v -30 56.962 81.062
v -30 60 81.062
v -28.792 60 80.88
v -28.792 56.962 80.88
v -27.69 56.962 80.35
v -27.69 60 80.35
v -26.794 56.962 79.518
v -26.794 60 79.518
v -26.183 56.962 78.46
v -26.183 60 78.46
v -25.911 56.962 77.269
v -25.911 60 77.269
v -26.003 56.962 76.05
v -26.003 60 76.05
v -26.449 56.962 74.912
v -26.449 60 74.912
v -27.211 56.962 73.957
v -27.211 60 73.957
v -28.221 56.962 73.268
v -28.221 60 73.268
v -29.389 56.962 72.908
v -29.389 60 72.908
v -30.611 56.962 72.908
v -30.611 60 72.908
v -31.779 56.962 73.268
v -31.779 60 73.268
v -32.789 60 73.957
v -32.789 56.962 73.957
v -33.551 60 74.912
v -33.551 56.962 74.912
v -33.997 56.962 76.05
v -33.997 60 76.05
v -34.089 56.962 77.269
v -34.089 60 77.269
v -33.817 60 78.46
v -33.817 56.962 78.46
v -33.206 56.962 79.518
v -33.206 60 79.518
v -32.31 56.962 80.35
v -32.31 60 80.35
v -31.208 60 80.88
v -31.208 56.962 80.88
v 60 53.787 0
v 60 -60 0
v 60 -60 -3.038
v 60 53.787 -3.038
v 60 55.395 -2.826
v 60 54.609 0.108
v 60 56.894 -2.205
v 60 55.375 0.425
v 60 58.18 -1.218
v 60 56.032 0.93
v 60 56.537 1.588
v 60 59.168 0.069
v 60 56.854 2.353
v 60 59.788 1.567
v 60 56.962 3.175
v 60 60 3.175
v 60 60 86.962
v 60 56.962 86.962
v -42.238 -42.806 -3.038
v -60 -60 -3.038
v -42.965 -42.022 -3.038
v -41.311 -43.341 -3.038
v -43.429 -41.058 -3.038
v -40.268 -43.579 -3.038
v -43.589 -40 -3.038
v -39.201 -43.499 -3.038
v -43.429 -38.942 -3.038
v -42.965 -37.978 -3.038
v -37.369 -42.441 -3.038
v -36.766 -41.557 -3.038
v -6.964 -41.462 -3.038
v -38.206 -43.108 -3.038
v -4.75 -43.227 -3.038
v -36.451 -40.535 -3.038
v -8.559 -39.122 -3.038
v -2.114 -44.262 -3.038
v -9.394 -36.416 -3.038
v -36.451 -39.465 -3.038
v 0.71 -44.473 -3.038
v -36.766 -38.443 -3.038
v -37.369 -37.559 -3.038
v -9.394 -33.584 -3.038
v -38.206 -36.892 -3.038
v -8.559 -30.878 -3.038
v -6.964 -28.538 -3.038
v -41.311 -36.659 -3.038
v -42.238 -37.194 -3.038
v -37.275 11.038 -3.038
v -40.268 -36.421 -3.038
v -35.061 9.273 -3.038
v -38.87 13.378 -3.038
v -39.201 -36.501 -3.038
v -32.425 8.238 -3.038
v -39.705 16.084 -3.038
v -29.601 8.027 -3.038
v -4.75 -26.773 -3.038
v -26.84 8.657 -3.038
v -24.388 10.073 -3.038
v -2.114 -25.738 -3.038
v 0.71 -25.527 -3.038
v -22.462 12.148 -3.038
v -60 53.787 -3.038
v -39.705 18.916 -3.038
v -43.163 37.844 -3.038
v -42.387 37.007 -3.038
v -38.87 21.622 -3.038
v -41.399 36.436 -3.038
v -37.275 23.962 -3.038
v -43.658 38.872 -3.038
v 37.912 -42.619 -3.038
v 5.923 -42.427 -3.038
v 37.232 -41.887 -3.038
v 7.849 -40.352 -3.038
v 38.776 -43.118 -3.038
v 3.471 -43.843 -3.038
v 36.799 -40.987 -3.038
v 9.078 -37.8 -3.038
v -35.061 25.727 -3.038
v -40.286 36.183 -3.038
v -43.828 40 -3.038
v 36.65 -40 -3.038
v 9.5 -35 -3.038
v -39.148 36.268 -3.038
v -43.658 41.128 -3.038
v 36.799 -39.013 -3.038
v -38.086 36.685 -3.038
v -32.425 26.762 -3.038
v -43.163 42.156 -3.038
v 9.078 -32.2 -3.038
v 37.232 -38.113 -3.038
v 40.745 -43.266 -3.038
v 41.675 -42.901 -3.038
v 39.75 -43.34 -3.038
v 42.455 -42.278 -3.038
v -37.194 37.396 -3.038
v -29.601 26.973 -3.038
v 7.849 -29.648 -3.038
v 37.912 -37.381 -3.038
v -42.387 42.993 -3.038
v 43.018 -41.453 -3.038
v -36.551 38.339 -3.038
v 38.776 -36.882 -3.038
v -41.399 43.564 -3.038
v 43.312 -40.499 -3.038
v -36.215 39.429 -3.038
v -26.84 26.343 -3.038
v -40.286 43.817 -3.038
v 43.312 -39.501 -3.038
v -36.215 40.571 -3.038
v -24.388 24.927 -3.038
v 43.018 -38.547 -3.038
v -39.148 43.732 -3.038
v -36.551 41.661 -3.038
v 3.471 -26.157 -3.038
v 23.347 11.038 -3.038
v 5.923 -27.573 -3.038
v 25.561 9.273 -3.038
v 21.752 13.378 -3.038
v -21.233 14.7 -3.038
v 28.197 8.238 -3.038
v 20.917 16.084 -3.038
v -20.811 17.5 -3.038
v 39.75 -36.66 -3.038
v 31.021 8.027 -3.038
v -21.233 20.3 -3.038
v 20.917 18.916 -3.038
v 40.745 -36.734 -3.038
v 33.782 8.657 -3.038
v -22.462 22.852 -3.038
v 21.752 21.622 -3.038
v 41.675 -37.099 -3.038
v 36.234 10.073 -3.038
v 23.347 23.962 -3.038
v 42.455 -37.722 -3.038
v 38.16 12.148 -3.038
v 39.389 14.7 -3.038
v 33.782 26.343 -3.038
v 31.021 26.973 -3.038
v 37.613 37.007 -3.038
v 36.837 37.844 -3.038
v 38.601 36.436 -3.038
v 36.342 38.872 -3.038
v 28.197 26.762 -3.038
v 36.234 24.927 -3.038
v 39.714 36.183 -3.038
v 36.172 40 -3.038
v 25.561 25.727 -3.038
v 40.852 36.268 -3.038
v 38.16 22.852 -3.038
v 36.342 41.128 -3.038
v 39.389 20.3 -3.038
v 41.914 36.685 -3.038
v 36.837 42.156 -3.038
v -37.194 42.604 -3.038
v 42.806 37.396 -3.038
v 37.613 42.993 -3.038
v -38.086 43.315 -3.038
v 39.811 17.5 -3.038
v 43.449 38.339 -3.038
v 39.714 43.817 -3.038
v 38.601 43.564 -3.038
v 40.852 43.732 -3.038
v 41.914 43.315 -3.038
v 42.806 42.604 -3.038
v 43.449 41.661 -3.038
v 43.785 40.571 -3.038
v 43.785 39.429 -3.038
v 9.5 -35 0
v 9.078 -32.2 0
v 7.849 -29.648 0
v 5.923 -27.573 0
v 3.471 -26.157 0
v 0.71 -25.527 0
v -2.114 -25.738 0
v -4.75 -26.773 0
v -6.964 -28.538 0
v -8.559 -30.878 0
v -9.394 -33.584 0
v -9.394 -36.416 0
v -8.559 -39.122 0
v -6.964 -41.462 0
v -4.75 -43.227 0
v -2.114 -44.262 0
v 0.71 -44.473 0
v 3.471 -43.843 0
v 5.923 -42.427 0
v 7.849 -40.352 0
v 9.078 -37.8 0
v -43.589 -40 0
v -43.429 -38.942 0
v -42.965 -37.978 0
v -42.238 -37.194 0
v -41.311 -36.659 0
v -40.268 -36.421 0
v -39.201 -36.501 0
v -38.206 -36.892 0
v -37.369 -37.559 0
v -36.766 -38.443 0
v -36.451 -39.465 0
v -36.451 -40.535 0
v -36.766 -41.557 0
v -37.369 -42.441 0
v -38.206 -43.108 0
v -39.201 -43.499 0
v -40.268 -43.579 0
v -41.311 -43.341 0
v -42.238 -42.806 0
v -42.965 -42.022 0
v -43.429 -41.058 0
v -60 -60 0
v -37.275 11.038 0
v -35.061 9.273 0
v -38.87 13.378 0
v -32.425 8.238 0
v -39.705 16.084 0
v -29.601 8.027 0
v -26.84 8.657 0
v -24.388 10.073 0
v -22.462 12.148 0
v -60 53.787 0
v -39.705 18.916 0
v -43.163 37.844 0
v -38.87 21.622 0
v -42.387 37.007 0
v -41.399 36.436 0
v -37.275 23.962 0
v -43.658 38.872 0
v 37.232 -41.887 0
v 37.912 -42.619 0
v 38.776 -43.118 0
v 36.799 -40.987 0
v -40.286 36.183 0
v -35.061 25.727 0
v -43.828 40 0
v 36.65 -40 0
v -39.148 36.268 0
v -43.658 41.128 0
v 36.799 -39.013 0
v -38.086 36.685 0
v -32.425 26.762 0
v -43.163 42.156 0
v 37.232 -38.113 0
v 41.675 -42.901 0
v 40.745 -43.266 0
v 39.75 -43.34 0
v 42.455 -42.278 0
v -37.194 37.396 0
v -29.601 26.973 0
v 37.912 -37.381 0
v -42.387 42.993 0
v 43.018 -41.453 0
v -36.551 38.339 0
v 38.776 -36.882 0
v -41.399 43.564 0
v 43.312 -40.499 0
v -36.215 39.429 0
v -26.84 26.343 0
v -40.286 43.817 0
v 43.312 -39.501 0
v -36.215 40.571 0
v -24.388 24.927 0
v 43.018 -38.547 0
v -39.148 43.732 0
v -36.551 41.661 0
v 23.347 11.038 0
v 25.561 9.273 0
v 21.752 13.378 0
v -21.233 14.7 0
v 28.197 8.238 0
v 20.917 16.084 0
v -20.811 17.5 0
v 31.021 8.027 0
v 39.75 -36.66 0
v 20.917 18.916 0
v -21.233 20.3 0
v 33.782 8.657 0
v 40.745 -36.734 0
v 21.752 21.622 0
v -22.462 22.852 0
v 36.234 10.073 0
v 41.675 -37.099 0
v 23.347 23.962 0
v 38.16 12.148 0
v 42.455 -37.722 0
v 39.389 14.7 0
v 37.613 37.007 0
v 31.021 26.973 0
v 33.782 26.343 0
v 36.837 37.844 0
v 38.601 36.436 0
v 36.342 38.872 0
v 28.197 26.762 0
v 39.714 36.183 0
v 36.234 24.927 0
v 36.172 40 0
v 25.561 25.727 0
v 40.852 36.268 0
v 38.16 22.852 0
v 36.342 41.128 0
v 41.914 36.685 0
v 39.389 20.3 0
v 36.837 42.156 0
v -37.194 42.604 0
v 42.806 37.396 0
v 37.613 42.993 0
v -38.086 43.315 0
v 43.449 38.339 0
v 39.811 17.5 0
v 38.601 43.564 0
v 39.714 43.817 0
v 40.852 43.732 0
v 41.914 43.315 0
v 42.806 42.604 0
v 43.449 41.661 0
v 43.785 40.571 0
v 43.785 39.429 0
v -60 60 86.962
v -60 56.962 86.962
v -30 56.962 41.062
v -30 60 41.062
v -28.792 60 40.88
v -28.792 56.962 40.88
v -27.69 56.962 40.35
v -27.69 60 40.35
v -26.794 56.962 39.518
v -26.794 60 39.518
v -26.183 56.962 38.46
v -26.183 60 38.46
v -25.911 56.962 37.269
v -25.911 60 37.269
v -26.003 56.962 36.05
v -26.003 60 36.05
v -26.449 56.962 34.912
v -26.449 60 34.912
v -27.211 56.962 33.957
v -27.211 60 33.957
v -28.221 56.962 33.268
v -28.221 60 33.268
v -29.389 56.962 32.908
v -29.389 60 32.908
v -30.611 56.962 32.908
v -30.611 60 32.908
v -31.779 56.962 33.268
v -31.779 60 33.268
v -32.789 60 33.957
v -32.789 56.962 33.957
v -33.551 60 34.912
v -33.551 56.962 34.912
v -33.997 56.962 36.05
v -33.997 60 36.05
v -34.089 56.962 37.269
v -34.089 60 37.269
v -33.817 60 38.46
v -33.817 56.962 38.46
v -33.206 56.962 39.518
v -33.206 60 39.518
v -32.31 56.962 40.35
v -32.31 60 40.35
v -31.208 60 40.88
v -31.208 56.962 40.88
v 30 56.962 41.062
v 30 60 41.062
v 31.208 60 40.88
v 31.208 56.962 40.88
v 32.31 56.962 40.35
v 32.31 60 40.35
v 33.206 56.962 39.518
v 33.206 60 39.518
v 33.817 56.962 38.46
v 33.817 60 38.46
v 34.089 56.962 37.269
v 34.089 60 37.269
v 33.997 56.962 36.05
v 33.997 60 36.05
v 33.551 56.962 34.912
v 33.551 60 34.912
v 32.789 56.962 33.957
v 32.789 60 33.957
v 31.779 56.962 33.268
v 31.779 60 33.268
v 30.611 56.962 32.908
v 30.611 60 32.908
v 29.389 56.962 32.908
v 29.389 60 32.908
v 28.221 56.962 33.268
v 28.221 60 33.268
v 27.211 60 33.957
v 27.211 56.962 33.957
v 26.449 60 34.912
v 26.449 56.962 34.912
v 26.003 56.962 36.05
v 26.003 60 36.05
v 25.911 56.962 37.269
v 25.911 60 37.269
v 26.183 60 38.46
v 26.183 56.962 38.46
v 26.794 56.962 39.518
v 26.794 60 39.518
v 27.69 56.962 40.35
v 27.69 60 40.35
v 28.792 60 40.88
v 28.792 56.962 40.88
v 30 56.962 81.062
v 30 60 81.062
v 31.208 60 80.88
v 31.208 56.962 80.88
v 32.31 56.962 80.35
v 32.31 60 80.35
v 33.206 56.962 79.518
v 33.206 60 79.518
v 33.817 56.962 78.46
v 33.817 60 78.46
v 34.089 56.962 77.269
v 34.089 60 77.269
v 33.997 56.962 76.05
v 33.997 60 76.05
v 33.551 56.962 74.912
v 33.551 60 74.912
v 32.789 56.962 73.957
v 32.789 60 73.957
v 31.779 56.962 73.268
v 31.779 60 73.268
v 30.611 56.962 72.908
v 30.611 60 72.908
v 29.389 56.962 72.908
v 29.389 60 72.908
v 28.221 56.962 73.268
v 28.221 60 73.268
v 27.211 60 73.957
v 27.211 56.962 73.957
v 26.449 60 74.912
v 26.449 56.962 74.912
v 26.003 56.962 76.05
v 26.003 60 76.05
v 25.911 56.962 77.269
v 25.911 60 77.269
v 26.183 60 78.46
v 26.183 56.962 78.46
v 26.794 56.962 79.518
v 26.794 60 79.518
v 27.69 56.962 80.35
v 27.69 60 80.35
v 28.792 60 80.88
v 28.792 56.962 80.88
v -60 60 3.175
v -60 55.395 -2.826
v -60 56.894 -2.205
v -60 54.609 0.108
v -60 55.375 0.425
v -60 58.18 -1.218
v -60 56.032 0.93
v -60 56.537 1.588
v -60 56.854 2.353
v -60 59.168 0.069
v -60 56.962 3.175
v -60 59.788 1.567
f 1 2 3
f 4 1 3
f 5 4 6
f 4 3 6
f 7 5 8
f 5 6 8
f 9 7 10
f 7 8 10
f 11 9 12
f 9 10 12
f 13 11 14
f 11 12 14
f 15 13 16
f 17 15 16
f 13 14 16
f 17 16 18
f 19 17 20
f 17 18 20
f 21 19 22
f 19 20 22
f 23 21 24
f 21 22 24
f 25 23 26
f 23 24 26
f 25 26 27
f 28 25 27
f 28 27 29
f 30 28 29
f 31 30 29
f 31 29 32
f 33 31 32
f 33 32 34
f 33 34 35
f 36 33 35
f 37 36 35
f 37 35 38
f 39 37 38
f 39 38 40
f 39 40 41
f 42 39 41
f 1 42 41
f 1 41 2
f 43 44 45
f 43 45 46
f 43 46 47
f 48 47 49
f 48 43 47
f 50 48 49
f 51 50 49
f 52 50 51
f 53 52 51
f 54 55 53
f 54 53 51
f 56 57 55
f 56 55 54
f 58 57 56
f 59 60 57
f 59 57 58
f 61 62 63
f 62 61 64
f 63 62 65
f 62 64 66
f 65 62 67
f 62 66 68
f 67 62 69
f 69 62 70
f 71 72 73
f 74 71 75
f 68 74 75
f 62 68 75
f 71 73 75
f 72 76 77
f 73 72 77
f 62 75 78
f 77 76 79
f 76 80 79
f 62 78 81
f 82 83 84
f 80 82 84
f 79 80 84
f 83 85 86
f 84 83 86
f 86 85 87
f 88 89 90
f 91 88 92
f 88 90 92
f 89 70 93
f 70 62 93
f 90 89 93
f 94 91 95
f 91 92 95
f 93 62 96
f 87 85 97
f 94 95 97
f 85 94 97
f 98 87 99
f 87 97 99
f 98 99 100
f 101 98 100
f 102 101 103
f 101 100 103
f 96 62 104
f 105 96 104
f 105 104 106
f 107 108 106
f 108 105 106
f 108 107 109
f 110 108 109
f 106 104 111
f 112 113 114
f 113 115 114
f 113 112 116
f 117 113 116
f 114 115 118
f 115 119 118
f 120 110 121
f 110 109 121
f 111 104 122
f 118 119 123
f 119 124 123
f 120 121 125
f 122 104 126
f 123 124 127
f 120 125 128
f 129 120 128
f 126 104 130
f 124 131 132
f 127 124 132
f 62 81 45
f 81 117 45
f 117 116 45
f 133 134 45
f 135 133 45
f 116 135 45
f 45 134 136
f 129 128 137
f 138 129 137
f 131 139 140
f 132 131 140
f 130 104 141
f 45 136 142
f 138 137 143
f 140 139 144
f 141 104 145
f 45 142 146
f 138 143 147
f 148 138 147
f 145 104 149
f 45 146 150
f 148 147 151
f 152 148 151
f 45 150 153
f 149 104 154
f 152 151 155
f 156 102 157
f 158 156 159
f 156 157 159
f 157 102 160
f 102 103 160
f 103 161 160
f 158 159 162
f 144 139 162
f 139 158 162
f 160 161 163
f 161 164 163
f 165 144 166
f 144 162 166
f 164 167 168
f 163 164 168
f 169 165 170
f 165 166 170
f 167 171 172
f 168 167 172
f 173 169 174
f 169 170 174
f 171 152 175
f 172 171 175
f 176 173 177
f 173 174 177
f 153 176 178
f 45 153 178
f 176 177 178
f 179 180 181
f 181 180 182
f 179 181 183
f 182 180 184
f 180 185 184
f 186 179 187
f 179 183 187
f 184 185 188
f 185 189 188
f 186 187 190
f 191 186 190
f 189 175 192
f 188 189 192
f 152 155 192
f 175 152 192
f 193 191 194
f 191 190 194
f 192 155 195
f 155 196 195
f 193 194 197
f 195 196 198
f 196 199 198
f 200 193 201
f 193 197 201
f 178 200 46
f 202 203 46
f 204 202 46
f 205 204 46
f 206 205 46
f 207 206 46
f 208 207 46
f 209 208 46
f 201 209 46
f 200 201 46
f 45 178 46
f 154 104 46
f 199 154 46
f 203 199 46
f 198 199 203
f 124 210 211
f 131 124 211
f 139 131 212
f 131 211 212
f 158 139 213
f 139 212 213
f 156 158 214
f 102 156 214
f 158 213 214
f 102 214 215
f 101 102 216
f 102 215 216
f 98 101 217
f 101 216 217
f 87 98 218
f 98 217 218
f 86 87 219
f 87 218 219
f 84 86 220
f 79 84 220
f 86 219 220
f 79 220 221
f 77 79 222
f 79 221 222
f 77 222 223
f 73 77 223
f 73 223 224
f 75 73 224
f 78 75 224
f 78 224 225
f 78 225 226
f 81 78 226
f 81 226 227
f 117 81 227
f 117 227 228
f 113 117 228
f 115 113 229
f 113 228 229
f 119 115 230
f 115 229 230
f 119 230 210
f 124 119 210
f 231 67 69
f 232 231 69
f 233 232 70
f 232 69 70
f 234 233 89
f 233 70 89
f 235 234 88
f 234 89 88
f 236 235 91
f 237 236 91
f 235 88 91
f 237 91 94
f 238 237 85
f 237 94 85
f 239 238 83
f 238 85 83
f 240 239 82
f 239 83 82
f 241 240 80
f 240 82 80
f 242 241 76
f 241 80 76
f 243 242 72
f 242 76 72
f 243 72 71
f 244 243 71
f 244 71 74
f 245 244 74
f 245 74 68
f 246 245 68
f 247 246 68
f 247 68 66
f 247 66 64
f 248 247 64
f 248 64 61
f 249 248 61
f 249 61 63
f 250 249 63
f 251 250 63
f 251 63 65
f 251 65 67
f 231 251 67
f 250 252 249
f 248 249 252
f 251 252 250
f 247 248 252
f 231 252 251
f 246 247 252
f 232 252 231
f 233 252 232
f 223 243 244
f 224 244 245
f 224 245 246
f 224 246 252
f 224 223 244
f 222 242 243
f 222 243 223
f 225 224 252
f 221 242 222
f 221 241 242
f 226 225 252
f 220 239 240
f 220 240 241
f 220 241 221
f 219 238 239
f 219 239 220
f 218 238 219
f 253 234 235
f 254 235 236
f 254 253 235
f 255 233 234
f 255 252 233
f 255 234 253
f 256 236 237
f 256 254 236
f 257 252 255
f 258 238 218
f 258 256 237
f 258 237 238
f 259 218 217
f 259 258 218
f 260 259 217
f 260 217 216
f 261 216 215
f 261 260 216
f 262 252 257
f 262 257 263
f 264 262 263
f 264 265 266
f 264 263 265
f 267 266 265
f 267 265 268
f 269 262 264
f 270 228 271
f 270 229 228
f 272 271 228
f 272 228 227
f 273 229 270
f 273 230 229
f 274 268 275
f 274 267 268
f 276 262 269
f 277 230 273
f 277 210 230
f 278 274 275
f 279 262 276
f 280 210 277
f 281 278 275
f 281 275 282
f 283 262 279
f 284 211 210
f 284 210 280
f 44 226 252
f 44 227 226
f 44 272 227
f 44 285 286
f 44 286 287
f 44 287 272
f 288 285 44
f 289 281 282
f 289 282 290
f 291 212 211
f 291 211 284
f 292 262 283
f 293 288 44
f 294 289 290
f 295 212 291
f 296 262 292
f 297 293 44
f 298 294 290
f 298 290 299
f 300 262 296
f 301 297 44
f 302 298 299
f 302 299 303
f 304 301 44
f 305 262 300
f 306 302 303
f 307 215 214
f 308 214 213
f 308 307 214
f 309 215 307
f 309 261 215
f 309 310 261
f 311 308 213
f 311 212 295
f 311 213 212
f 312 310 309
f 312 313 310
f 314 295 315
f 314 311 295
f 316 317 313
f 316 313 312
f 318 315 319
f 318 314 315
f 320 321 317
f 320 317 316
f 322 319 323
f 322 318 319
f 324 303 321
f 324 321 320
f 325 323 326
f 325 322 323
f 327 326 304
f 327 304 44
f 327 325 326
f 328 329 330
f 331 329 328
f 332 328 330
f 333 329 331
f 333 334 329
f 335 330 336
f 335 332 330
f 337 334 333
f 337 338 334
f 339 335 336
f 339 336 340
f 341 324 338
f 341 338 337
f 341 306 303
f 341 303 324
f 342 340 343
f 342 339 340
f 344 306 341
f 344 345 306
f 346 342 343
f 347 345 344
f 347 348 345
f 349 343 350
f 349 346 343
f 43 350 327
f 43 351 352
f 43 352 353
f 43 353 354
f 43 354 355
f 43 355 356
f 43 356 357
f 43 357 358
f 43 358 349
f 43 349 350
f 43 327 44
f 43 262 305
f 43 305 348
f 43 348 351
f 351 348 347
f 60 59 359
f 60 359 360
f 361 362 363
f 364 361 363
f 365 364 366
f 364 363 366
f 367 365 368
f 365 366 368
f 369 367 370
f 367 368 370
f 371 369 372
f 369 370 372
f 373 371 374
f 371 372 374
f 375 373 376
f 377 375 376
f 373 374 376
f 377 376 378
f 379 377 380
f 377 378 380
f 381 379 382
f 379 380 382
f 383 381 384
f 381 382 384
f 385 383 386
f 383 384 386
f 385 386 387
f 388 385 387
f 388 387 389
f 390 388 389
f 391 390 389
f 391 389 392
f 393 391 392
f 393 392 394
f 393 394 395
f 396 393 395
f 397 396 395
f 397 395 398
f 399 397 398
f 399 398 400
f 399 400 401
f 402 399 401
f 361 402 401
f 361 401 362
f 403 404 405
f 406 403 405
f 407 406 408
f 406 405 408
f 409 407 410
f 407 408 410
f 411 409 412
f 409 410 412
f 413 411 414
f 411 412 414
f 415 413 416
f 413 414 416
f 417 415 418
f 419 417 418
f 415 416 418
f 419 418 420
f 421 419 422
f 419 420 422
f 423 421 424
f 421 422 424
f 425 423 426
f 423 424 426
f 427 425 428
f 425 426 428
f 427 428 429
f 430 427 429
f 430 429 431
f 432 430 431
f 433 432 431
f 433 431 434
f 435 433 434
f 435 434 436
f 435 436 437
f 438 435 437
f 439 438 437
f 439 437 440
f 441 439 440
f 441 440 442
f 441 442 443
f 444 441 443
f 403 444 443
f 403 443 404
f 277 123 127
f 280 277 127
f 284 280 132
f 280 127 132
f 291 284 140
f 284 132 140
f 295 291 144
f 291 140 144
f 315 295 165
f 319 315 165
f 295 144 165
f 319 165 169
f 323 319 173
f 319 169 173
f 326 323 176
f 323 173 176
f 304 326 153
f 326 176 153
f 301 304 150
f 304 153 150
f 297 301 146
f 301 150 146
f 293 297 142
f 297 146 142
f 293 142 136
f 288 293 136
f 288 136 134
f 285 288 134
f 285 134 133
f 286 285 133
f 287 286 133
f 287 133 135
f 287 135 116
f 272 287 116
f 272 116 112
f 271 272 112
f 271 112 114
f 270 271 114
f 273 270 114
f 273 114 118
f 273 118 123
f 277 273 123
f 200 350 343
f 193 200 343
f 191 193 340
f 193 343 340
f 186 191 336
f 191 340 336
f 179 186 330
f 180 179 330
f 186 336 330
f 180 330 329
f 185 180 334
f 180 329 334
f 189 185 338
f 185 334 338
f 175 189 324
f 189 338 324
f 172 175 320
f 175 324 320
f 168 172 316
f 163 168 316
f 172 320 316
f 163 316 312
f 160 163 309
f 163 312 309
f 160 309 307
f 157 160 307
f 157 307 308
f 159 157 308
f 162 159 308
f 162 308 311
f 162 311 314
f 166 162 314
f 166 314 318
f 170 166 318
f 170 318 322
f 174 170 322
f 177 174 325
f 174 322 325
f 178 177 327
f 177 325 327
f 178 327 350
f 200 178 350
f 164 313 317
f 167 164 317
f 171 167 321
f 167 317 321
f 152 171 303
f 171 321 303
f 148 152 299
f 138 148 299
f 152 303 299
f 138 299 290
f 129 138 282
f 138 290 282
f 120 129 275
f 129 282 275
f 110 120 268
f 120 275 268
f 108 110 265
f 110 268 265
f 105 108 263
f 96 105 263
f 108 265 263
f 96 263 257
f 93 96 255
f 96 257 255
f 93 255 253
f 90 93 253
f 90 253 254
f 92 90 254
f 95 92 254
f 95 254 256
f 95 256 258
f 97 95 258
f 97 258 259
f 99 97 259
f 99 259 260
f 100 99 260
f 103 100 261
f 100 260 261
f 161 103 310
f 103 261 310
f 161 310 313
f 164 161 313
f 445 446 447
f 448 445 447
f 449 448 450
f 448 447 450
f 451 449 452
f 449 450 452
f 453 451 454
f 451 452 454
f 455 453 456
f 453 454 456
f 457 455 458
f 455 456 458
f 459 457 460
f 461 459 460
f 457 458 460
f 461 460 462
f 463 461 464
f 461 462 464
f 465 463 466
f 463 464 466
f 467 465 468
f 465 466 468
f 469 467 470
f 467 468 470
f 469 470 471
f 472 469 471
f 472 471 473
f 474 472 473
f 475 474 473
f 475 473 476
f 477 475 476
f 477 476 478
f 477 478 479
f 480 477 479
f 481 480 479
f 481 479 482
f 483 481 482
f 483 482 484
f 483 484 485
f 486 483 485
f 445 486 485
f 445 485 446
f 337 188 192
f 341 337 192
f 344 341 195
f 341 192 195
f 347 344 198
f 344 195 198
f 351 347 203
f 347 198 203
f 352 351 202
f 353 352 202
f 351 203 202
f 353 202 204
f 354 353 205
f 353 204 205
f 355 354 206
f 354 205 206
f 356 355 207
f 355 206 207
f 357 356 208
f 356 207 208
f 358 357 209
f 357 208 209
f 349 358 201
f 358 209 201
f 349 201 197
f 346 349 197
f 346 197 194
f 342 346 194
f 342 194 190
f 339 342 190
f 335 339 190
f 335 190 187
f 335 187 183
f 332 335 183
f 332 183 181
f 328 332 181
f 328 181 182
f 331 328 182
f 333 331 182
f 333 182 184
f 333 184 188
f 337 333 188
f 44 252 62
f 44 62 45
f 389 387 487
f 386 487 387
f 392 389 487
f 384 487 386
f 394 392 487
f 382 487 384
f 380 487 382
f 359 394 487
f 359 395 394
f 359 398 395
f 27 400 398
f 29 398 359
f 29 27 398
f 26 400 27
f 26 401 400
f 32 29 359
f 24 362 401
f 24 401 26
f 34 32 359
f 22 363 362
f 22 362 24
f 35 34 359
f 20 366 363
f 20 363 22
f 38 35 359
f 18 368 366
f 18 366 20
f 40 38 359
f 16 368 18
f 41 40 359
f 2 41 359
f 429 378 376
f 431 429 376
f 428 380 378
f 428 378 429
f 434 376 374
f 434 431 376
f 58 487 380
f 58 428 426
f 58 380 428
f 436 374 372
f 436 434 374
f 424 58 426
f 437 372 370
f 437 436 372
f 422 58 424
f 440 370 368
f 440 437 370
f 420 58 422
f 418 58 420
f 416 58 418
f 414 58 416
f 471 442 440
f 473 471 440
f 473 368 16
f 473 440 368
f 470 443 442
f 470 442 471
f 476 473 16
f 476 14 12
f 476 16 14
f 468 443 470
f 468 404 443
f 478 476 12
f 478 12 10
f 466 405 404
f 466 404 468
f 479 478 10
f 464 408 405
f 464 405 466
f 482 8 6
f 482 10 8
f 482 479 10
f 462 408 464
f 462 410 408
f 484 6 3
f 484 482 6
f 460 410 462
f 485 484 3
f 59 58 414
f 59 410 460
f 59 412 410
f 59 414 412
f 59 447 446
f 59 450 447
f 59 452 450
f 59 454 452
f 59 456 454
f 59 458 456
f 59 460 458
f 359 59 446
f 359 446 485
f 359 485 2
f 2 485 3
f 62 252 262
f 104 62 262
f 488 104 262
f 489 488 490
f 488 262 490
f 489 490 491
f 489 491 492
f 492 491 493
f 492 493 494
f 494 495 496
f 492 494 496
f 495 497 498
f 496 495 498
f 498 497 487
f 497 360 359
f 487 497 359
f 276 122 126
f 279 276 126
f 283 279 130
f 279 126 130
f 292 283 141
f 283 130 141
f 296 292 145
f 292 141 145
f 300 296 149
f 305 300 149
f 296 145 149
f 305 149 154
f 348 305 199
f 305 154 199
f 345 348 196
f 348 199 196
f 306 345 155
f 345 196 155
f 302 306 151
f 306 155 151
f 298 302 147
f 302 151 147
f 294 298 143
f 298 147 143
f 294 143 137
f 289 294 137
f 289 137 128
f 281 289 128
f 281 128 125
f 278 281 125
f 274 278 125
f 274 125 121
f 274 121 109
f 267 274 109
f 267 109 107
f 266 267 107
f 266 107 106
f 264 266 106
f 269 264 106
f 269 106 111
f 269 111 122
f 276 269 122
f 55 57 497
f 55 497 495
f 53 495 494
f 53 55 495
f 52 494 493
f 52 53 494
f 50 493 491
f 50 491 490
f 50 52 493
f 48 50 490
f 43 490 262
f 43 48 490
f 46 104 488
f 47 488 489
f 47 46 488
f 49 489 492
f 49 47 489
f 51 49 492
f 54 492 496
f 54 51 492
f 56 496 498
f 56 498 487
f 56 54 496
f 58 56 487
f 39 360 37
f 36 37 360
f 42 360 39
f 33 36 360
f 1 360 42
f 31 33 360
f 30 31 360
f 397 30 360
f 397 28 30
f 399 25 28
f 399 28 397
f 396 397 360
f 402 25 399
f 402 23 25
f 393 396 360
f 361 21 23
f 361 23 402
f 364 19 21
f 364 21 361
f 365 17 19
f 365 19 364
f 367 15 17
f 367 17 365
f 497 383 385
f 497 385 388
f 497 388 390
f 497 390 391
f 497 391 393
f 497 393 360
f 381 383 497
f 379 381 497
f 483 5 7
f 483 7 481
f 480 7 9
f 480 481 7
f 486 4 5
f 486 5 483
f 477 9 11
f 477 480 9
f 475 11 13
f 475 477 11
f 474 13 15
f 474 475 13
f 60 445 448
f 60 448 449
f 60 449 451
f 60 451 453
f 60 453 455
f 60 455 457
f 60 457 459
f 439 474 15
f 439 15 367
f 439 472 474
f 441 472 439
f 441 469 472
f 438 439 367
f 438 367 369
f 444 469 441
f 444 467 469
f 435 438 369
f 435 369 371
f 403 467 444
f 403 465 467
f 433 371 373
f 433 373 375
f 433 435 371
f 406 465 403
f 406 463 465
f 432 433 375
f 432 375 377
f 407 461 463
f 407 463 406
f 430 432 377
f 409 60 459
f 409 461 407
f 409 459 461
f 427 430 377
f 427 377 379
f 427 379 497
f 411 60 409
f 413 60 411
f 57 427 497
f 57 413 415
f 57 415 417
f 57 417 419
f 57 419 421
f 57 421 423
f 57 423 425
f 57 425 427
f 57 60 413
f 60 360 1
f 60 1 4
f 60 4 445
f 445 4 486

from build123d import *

# Parameters (mm, degrees)
CROQUIS1_W                       = 120
CROQUIS1_H                       = 120
CROQUIS1_R                       = 9.5
BRIDA_BASE1_DEPTH                = 3.03784
BRIDA_DE_ARISTA1_STRIP_W         = 18.50136
BRIDA_DE_ARISTA1_STRIP_H         = 3.03784
BRIDA_DE_ARISTA1_STRIP_CUT_DEPTH = 120
BRIDA_DE_ARISTA1_DEPTH           = 120
CORTAR_EXTRUIR1_REACH            = 161.883
CROQUIS9_R                       = 4.1
CORTAR_EXTRUIR2_REACH            = 125.693
CROQUIS10_R                      = 3.828194302
CROQUIS10_R_2                    = 3.588932158
CROQUIS10_R_3                    = 3.349670014


# Sheet-metal steps are written as plain solids
with BuildPart() as part:
    # Croquis1 → Brida base1 (new body)
    with BuildSketch(Plane.XY):
        Rectangle(CROQUIS1_W, CROQUIS1_H)
        with Locations((0, -35)):
            Circle(CROQUIS1_R, mode=Mode.SUBTRACT)
        with Locations((-30.310889132, 17.5)):
            Circle(CROQUIS1_R, mode=Mode.SUBTRACT)
        with Locations((30.310889132, 17.5)):
            Circle(CROQUIS1_R, mode=Mode.SUBTRACT)
    extrude(amount=-BRIDA_BASE1_DEPTH)

    # Brida de arista1 strip (across the edge) → Brida de arista1 strip cut (cut)
    with BuildSketch(Plane(origin=(60, 60, 0), x_dir=(0, -1, 0), z_dir=(-1, 0, 0))):
        with Locations((-3.03784, -1.51892)):
            Rectangle(BRIDA_DE_ARISTA1_STRIP_W, BRIDA_DE_ARISTA1_STRIP_H)
    extrude(amount=BRIDA_DE_ARISTA1_STRIP_CUT_DEPTH, mode=Mode.SUBTRACT)

    # Brida de arista1 section (across the edge) → Brida de arista1 (add)
    with BuildSketch(Plane(origin=(60, 60, 0), x_dir=(0, -1, 0), z_dir=(-1, 0, 0))):
        with BuildLine():
            Line((0, 3.175), (0, 86.96216))
            Line((0, 86.96216), (3.03784, 86.96216))
            Line((3.03784, 86.96216), (3.03784, 3.175))
            ThreePointArc((3.03784, 3.175), (3.96777597, 0.92993597), (6.21284, 0))
            Line((6.21284, 0), (6.21284, -3.03784))
            ThreePointArc((6.21284, -3.03784), (1.819698706, -1.218141294), (0, 3.175))
        make_face()
    extrude(amount=BRIDA_DE_ARISTA1_DEPTH)

    # Croquis9 → Cortar-Extruir1 (cut, up to next)
    with BuildSketch(Plane(origin=(0, 60, 0), x_dir=(1, 0, 0), z_dir=(0, 1, 0)), mode=Mode.PRIVATE) as cortar_extruir1_sk1:
        with Locations(Location((-30, -76.96216, 0), (0, 0, 270))):
            Circle(CROQUIS9_R)
    cortar_extruir1_tool1 = extrude(cortar_extruir1_sk1.sketch, amount=-CORTAR_EXTRUIR1_REACH, mode=Mode.PRIVATE) & part.part
    # Croquis9 → Cortar-Extruir1 (cut, up to next)
    with BuildSketch(Plane(origin=(0, 60, 0), x_dir=(1, 0, 0), z_dir=(0, 1, 0)), mode=Mode.PRIVATE) as cortar_extruir1_sk2:
        with Locations(Location((-30, -36.96216, 0), (0, 0, 270))):
            Circle(CROQUIS9_R)
    cortar_extruir1_tool2 = extrude(cortar_extruir1_sk2.sketch, amount=-CORTAR_EXTRUIR1_REACH, mode=Mode.PRIVATE) & part.part
    # Croquis9 → Cortar-Extruir1 (cut, up to next)
    with BuildSketch(Plane(origin=(0, 60, 0), x_dir=(1, 0, 0), z_dir=(0, 1, 0)), mode=Mode.PRIVATE) as cortar_extruir1_sk3:
        with Locations(Location((30, -36.96216, 0), (0, 0, 270))):
            Circle(CROQUIS9_R)
    cortar_extruir1_tool3 = extrude(cortar_extruir1_sk3.sketch, amount=-CORTAR_EXTRUIR1_REACH, mode=Mode.PRIVATE) & part.part
    # Croquis9 → Cortar-Extruir1 (cut, up to next)
    with BuildSketch(Plane(origin=(0, 60, 0), x_dir=(1, 0, 0), z_dir=(0, 1, 0)), mode=Mode.PRIVATE) as cortar_extruir1_sk4:
        with Locations(Location((30, -76.96216, 0), (0, 0, 270))):
            Circle(CROQUIS9_R)
    cortar_extruir1_tool4 = extrude(cortar_extruir1_sk4.sketch, amount=-CORTAR_EXTRUIR1_REACH, mode=Mode.PRIVATE) & part.part
    add(cortar_extruir1_tool1.solids().sort_by_distance((-30, 60, 76.96216))[0], mode=Mode.SUBTRACT)
    add(cortar_extruir1_tool2.solids().sort_by_distance((-30, 60, 36.96216))[0], mode=Mode.SUBTRACT)
    add(cortar_extruir1_tool3.solids().sort_by_distance((30, 60, 36.96216))[0], mode=Mode.SUBTRACT)
    add(cortar_extruir1_tool4.solids().sort_by_distance((30, 60, 76.96216))[0], mode=Mode.SUBTRACT)

    # Croquis10 → Cortar-Extruir2 (cut, up to next)
    with BuildSketch(Plane(origin=(0, 0, -3.03784), x_dir=(-1, 0, 0), z_dir=(0, 0, -1)), mode=Mode.PRIVATE) as cortar_extruir2_sk1:
        with Locations((40, 40)):
            Circle(CROQUIS10_R)
    cortar_extruir2_tool1 = extrude(cortar_extruir2_sk1.sketch, amount=-CORTAR_EXTRUIR2_REACH, mode=Mode.PRIVATE) & part.part
    # Croquis10 → Cortar-Extruir2 (cut, up to next)
    with BuildSketch(Plane(origin=(0, 0, -3.03784), x_dir=(-1, 0, 0), z_dir=(0, 0, -1)), mode=Mode.PRIVATE) as cortar_extruir2_sk2:
        with Locations((40, -40)):
            Circle(CROQUIS10_R_2)
    cortar_extruir2_tool2 = extrude(cortar_extruir2_sk2.sketch, amount=-CORTAR_EXTRUIR2_REACH, mode=Mode.PRIVATE) & part.part
    # Croquis10 → Cortar-Extruir2 (cut, up to next)
    with BuildSketch(Plane(origin=(0, 0, -3.03784), x_dir=(-1, 0, 0), z_dir=(0, 0, -1)), mode=Mode.PRIVATE) as cortar_extruir2_sk3:
        with Locations((-40, -40)):
            Circle(CROQUIS10_R_3)
    cortar_extruir2_tool3 = extrude(cortar_extruir2_sk3.sketch, amount=-CORTAR_EXTRUIR2_REACH, mode=Mode.PRIVATE) & part.part
    # Croquis10 → Cortar-Extruir2 (cut, up to next)
    with BuildSketch(Plane(origin=(0, 0, -3.03784), x_dir=(-1, 0, 0), z_dir=(0, 0, -1)), mode=Mode.PRIVATE) as cortar_extruir2_sk4:
        with Locations((-40, 40)):
            Circle(CROQUIS10_R)
    cortar_extruir2_tool4 = extrude(cortar_extruir2_sk4.sketch, amount=-CORTAR_EXTRUIR2_REACH, mode=Mode.PRIVATE) & part.part
    add(cortar_extruir2_tool1.solids().sort_by_distance((-40, 40, -3.03784))[0], mode=Mode.SUBTRACT)
    add(cortar_extruir2_tool2.solids().sort_by_distance((-40, -40, -3.03784))[0], mode=Mode.SUBTRACT)
    add(cortar_extruir2_tool3.solids().sort_by_distance((40, -40, -3.03784))[0], mode=Mode.SUBTRACT)
    add(cortar_extruir2_tool4.solids().sort_by_distance((40, 40, -3.03784))[0], mode=Mode.SUBTRACT)


solid = part.part
